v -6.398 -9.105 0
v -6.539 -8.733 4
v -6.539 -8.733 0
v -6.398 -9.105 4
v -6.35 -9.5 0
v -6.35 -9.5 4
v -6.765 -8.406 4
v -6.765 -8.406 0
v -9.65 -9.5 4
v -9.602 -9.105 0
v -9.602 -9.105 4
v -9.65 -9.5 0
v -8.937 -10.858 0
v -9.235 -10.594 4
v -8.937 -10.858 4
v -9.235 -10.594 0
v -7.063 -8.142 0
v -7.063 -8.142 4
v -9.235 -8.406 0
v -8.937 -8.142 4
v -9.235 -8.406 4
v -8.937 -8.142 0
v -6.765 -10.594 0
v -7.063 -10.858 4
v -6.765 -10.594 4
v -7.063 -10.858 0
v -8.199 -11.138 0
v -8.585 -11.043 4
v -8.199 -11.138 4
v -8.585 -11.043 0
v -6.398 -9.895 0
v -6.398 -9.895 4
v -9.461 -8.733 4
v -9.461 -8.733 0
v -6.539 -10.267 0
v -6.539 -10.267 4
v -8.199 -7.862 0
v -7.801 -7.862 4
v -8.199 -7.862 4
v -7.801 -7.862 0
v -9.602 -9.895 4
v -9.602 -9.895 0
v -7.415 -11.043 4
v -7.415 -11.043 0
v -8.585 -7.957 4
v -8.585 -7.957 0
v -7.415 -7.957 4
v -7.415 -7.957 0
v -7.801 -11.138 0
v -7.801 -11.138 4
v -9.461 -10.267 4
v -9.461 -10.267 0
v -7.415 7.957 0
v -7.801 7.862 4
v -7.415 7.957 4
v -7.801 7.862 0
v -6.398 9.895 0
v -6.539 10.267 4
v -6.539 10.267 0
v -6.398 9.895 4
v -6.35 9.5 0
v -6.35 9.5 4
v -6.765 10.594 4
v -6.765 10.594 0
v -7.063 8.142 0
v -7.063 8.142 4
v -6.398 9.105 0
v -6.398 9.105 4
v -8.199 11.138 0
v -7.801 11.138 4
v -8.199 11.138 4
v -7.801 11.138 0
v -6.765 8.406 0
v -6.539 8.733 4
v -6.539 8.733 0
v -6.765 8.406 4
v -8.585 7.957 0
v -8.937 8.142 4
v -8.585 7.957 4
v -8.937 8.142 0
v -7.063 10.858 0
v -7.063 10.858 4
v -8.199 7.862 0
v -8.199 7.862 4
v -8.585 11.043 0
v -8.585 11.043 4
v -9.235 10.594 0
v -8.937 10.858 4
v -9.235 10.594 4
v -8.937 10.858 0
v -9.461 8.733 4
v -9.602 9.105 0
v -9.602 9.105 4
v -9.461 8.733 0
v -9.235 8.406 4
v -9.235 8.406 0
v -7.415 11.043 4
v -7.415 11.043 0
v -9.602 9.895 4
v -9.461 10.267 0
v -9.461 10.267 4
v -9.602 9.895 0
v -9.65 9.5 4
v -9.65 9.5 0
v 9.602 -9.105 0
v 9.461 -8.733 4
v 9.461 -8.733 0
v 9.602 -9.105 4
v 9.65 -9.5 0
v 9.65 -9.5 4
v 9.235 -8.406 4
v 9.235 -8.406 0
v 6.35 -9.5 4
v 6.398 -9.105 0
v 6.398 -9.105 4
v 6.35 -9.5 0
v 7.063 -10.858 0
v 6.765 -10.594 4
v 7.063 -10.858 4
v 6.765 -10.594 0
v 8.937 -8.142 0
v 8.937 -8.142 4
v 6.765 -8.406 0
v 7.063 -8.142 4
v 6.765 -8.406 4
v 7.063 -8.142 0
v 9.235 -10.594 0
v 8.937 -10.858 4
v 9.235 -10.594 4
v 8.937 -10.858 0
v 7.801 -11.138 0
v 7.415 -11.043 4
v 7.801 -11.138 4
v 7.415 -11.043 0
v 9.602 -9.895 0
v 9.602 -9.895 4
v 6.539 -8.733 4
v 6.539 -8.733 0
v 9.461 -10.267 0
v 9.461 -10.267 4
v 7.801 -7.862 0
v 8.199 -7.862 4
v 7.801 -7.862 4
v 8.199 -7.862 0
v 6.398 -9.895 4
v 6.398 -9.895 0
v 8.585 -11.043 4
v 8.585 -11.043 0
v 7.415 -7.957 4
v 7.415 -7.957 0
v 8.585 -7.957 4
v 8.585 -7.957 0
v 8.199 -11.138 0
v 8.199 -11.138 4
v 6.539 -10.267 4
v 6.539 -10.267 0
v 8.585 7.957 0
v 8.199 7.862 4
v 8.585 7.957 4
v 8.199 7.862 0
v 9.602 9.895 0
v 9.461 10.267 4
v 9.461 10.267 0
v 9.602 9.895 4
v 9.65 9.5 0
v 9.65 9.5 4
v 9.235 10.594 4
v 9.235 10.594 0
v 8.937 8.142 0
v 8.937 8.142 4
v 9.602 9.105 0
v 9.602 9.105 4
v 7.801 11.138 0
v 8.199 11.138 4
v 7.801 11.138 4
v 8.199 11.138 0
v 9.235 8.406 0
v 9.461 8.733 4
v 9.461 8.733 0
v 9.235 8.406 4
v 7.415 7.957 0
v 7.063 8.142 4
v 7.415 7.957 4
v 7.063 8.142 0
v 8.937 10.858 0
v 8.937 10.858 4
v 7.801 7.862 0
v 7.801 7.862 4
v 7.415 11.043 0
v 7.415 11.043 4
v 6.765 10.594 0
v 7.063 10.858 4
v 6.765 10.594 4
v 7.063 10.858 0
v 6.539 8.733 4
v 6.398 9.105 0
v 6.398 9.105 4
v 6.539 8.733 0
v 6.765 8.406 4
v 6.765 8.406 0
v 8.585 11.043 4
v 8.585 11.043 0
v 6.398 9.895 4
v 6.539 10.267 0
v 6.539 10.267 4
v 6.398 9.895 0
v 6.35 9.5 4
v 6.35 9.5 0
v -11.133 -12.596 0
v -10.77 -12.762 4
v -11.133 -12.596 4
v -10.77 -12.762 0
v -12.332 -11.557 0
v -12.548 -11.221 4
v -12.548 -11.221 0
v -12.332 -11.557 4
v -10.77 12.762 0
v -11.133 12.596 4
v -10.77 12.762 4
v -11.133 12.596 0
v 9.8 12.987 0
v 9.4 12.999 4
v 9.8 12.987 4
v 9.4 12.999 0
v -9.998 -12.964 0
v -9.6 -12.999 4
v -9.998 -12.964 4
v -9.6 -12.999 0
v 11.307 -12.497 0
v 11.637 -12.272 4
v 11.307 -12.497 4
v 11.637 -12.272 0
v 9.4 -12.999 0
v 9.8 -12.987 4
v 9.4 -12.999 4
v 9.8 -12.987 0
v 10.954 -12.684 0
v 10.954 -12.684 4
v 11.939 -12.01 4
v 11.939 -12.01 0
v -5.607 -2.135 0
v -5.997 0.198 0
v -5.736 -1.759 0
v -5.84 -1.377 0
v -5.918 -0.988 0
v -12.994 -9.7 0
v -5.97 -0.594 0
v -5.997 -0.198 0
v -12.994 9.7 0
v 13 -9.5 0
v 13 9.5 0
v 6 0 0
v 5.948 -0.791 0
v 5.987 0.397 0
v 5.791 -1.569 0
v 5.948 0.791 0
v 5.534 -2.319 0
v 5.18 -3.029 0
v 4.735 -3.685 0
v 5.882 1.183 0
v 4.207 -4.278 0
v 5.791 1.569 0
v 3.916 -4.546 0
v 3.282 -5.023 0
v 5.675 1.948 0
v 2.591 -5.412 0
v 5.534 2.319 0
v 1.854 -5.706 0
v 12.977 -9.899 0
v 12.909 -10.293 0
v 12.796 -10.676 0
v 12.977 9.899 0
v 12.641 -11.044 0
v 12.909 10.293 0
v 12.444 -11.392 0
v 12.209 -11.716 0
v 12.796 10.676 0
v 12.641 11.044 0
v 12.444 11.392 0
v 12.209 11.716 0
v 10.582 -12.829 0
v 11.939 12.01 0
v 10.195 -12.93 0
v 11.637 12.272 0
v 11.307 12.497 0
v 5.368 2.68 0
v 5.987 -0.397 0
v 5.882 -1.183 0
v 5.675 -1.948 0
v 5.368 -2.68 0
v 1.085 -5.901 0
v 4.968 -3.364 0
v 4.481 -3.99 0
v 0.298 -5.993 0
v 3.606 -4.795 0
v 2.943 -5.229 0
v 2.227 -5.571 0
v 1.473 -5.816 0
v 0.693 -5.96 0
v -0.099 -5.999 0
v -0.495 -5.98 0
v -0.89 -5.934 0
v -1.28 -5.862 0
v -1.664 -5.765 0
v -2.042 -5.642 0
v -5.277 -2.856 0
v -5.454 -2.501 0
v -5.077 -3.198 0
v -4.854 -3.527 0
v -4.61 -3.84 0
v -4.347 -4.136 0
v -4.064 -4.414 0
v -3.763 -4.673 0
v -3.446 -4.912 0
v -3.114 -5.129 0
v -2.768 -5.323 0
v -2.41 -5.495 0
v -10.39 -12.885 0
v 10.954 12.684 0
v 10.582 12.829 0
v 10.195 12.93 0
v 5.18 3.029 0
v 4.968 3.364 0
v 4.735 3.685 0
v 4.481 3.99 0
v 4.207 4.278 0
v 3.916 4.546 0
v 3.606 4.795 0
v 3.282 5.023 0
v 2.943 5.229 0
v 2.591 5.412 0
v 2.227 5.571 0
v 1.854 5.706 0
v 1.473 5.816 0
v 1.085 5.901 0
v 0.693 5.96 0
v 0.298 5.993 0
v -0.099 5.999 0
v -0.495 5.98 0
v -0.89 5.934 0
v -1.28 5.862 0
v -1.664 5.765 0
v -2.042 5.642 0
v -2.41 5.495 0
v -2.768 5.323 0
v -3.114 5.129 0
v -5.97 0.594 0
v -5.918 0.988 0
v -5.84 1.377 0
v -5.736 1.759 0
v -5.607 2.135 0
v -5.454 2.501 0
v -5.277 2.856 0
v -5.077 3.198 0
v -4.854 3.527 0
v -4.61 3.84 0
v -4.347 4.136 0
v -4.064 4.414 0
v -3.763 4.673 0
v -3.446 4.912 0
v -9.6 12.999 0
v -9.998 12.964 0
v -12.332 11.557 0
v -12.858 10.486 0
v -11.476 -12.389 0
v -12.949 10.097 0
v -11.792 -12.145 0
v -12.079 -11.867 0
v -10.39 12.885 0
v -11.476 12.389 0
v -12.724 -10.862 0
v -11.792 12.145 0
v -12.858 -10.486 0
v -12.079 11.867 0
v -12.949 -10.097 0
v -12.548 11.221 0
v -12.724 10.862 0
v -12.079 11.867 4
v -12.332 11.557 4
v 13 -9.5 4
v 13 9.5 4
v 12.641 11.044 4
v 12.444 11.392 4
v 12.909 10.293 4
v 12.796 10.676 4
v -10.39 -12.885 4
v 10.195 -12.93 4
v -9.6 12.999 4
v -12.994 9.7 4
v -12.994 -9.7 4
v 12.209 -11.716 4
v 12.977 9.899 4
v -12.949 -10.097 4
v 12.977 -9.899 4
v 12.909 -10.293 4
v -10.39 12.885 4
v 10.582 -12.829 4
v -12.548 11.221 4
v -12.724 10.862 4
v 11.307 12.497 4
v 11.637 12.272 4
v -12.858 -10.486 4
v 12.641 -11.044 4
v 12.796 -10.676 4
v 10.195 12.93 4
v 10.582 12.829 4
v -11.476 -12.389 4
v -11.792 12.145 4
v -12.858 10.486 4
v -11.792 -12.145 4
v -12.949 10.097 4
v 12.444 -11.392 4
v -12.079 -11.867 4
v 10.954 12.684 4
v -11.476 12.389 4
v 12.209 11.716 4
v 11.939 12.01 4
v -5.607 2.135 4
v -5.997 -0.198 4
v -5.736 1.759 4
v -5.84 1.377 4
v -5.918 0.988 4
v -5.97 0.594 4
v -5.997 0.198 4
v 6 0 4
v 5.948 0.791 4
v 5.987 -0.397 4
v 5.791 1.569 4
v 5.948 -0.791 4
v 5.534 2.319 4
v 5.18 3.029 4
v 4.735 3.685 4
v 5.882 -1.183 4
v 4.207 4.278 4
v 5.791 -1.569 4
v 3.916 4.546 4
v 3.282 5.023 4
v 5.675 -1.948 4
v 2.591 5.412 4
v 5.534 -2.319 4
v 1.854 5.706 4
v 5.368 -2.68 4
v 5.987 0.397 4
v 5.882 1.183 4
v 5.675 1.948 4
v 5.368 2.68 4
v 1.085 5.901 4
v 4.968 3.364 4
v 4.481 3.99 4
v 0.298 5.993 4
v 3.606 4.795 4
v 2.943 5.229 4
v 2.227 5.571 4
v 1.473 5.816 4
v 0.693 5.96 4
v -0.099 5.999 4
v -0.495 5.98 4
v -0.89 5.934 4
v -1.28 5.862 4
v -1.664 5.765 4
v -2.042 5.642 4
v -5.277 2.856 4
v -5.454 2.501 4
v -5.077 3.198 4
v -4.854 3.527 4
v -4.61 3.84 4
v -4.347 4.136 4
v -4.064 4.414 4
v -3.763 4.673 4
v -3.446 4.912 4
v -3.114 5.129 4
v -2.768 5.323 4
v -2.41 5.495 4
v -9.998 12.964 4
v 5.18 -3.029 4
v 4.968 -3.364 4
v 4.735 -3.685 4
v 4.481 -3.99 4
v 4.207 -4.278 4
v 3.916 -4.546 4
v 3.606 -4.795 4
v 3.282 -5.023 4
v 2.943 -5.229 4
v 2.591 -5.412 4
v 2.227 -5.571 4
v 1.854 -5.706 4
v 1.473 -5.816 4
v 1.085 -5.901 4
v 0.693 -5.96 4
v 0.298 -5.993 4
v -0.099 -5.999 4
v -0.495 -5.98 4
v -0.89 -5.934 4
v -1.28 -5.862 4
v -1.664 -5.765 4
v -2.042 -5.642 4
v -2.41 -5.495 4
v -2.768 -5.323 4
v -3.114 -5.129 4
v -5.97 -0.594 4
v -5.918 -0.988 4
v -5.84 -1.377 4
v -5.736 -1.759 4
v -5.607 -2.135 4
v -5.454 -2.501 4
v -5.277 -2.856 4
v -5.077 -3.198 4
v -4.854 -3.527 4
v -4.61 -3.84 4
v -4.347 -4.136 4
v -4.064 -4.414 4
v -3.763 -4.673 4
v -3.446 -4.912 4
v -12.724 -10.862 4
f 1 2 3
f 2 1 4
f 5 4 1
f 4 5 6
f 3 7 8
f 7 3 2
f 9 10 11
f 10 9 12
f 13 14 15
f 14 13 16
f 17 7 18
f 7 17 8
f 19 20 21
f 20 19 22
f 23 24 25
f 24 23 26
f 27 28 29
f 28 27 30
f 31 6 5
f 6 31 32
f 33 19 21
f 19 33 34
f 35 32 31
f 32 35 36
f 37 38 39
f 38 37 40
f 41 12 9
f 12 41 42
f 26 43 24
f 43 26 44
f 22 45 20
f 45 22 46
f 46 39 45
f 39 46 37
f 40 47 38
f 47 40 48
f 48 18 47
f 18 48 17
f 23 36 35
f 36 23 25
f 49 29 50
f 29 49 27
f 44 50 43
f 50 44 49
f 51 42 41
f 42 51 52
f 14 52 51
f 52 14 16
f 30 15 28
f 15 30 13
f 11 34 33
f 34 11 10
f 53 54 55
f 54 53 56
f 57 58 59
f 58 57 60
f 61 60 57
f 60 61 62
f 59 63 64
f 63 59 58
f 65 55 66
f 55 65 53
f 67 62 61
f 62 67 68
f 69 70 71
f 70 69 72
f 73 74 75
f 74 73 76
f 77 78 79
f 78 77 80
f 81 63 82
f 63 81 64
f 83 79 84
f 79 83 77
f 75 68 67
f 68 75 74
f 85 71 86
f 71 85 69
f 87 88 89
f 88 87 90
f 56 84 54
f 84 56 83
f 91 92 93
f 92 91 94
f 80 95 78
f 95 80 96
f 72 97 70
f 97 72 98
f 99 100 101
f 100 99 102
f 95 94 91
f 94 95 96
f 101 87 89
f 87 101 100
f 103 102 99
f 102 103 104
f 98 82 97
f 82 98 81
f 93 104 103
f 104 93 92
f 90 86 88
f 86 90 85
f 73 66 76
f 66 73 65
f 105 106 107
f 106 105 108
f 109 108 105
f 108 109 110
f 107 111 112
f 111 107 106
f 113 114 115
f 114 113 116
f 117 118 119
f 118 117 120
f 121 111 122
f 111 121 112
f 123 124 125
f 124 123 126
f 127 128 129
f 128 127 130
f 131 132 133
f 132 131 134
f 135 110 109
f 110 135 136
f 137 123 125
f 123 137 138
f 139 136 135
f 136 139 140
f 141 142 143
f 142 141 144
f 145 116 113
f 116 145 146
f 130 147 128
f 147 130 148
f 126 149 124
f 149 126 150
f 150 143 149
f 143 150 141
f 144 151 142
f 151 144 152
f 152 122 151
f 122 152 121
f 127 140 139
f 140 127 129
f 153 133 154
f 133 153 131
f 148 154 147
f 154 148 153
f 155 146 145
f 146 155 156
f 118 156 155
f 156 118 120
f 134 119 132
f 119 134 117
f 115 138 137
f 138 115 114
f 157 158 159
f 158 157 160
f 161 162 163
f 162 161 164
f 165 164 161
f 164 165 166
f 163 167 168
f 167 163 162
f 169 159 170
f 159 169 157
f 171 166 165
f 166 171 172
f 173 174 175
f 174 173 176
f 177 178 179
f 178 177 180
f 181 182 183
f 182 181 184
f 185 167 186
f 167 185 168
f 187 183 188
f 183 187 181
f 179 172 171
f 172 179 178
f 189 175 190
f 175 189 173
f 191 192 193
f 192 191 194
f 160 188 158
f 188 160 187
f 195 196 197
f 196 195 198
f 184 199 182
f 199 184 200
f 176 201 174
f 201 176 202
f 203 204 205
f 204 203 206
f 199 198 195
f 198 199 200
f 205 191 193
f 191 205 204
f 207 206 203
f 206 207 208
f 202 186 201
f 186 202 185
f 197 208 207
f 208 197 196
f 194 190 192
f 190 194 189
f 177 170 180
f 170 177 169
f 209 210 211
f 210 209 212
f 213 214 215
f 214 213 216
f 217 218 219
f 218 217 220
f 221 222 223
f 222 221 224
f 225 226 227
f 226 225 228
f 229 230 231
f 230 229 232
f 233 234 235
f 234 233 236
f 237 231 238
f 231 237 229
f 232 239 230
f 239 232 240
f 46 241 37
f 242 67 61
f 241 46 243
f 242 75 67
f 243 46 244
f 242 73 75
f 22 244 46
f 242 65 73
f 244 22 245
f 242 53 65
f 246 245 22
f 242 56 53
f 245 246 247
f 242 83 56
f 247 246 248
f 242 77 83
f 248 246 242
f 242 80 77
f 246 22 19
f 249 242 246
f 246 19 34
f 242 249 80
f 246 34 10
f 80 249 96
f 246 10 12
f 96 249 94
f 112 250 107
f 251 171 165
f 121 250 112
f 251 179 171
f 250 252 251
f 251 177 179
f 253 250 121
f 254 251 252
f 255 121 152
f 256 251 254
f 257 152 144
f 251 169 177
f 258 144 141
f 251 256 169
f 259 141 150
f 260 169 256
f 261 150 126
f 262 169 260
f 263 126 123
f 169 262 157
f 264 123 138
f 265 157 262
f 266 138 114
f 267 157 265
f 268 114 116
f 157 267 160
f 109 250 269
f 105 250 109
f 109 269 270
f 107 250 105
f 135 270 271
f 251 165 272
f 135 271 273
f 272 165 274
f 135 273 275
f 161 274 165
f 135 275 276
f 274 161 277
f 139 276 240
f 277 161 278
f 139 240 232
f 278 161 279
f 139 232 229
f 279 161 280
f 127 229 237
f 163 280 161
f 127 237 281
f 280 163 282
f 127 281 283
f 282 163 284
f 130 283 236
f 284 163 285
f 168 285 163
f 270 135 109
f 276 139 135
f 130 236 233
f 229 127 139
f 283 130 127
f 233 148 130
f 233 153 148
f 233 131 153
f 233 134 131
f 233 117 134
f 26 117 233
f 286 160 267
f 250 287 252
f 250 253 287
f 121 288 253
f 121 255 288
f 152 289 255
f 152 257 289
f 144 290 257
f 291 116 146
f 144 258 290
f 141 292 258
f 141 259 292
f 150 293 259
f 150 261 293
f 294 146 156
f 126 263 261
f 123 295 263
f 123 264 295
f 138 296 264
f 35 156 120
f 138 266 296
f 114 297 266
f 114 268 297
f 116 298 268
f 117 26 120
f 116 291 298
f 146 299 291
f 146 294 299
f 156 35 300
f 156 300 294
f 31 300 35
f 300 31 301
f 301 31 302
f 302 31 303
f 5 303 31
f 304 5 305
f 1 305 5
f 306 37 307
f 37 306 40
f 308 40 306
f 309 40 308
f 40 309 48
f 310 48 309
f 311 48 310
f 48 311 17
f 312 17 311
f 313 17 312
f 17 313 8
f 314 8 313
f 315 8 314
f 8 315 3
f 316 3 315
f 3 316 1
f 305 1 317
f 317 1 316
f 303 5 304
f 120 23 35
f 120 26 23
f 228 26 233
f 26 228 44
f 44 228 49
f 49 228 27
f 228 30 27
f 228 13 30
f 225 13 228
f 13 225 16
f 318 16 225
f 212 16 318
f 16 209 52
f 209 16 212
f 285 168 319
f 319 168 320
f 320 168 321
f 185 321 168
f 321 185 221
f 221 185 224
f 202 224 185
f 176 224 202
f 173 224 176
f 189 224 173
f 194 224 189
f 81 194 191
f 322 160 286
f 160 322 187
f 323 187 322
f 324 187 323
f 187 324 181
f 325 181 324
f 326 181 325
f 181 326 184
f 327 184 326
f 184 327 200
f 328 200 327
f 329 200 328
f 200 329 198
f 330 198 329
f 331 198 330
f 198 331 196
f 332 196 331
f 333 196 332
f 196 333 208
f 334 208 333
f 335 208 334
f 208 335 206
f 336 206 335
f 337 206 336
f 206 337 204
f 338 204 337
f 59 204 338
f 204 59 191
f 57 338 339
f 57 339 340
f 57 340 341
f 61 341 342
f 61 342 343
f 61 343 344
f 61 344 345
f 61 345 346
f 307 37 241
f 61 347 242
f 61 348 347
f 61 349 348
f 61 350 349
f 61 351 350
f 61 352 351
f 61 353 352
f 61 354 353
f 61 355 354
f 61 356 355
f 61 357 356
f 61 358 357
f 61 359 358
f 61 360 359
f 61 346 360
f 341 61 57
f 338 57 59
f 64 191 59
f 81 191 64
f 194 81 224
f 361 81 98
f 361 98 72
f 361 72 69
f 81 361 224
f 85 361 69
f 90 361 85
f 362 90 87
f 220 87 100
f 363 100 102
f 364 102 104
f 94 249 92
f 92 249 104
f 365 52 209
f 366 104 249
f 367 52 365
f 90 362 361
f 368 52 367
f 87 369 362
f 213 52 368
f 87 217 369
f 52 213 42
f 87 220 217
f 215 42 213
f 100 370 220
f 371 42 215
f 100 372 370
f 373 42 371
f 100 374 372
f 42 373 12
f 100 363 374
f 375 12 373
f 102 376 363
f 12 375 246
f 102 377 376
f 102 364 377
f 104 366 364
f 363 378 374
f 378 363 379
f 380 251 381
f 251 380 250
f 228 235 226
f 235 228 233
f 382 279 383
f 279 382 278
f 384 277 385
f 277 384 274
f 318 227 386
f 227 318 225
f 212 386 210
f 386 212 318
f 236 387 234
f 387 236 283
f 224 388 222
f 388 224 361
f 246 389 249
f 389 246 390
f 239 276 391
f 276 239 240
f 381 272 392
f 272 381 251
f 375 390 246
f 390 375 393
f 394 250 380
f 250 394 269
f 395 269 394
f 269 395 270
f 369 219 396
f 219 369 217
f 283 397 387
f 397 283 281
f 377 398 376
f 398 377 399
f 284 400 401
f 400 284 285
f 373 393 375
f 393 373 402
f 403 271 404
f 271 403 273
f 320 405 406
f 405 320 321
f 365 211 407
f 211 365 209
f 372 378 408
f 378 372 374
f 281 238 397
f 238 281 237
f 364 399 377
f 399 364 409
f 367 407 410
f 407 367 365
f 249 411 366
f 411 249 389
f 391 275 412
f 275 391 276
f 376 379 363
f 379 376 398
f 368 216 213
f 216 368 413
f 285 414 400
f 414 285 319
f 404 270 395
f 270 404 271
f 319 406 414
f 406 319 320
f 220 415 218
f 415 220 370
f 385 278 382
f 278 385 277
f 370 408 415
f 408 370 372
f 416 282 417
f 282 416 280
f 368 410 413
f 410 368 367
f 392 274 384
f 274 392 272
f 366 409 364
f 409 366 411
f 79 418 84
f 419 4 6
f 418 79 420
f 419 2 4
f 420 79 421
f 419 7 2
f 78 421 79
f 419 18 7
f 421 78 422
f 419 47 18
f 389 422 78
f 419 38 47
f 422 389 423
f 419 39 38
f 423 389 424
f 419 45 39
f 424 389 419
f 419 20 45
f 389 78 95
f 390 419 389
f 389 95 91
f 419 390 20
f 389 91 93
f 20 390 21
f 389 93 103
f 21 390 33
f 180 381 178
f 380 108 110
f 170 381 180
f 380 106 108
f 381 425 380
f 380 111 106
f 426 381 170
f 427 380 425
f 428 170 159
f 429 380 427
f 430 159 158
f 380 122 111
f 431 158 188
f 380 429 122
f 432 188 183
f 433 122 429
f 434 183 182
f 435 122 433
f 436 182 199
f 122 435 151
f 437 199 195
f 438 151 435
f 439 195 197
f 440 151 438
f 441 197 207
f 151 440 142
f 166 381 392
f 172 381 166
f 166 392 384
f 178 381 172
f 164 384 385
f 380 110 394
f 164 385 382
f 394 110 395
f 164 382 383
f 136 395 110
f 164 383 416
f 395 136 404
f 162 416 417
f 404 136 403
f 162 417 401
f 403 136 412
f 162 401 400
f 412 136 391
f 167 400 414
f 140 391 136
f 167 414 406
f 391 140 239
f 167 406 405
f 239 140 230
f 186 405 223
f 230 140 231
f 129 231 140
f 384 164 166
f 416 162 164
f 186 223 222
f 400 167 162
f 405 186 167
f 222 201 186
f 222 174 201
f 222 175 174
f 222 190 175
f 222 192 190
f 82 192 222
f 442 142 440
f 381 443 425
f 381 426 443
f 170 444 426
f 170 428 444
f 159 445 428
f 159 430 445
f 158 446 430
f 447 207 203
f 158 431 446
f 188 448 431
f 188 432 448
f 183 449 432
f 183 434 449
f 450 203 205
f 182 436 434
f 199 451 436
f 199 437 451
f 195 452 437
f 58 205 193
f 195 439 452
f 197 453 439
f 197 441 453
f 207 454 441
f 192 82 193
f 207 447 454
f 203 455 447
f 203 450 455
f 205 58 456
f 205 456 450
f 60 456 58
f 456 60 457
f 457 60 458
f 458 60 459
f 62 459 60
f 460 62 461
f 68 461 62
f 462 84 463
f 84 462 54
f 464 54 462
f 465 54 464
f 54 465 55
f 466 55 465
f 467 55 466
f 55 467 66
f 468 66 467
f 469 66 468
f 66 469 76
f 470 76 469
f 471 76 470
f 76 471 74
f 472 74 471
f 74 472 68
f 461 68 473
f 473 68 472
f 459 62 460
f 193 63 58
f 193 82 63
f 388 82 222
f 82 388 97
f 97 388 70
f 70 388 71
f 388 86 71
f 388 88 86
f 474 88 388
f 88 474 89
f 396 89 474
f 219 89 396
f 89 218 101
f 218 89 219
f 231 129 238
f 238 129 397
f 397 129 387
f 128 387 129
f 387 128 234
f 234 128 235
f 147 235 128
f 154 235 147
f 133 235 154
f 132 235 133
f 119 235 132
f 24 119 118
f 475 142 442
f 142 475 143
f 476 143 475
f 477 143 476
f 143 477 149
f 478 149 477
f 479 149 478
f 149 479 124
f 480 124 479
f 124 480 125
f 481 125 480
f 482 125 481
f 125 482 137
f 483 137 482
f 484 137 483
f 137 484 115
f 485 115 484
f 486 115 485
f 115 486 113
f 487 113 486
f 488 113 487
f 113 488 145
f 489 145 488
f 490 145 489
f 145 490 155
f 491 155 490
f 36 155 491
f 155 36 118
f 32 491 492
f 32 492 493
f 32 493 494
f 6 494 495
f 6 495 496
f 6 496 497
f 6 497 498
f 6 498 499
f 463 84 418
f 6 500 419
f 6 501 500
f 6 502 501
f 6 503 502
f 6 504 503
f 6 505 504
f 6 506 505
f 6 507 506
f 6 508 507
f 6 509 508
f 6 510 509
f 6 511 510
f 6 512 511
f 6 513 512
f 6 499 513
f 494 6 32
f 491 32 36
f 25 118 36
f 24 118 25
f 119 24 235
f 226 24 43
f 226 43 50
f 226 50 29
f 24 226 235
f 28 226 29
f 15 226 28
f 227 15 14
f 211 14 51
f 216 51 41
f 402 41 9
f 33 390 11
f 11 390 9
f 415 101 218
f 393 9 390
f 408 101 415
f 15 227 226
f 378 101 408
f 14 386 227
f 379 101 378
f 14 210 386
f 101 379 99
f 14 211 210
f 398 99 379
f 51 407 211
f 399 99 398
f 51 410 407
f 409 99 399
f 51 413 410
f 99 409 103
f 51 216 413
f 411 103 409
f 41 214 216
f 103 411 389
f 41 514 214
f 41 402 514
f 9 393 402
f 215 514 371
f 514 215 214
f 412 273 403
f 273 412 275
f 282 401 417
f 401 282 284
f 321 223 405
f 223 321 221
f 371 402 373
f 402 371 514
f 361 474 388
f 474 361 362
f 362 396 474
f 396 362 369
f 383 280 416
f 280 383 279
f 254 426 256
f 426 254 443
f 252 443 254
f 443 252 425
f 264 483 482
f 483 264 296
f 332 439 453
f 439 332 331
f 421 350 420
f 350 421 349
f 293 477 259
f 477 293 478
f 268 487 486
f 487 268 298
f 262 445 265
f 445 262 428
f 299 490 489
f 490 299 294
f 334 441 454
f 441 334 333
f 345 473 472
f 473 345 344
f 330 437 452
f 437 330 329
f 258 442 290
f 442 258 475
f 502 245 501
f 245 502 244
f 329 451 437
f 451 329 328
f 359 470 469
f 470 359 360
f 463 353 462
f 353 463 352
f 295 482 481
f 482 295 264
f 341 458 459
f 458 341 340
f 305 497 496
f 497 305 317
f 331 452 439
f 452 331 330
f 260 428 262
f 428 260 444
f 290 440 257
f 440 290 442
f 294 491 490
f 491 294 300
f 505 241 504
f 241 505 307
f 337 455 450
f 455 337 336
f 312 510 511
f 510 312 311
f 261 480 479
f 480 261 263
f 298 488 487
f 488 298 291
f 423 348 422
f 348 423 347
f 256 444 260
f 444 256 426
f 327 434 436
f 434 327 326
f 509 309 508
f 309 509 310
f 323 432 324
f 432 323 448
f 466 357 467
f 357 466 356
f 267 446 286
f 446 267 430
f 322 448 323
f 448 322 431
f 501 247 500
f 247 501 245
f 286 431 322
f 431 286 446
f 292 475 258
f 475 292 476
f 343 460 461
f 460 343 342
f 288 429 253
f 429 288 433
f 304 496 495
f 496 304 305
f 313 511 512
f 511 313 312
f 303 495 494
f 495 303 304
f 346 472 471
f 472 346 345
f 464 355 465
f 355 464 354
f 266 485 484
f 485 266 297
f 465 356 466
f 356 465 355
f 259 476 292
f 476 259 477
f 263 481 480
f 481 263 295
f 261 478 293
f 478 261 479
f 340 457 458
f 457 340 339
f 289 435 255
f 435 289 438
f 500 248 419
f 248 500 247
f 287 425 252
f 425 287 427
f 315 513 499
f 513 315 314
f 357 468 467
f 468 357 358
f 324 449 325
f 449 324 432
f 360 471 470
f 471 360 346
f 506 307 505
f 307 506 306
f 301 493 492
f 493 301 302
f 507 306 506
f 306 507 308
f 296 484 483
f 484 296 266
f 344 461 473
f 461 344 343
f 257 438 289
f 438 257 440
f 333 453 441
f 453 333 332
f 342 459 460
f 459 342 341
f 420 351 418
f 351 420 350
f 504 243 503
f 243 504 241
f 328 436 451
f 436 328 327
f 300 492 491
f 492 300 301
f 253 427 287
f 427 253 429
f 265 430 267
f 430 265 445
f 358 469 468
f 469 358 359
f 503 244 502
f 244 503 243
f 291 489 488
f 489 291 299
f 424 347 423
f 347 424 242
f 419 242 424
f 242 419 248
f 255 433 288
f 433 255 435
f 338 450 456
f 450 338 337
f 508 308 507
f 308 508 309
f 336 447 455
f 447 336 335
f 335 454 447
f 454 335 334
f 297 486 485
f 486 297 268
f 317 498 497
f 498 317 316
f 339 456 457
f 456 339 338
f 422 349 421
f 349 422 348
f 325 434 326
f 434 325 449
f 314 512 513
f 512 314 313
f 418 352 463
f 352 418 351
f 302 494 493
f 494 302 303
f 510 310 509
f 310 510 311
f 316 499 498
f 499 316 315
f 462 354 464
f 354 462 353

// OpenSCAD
$fa = 2;
$fs = 0.4;

module motor_base() {
  color("#b8bcc0")
    difference() {
      hull() {
        for (x = [-9.5, 9.5], y = [-9.5, 9.5])
          translate([x, y, 0])
            cylinder(h = 4, d = 7);
      }
      translate([0, 0, -1])
        cylinder(h = 6, d = 12);
      for (sx = [-1, 1], sy = [-1, 1])
        translate([sx * 8, sy * 9.5, -1])
          cylinder(h = 6, d = 3.3);
    }
}

motor_base();
